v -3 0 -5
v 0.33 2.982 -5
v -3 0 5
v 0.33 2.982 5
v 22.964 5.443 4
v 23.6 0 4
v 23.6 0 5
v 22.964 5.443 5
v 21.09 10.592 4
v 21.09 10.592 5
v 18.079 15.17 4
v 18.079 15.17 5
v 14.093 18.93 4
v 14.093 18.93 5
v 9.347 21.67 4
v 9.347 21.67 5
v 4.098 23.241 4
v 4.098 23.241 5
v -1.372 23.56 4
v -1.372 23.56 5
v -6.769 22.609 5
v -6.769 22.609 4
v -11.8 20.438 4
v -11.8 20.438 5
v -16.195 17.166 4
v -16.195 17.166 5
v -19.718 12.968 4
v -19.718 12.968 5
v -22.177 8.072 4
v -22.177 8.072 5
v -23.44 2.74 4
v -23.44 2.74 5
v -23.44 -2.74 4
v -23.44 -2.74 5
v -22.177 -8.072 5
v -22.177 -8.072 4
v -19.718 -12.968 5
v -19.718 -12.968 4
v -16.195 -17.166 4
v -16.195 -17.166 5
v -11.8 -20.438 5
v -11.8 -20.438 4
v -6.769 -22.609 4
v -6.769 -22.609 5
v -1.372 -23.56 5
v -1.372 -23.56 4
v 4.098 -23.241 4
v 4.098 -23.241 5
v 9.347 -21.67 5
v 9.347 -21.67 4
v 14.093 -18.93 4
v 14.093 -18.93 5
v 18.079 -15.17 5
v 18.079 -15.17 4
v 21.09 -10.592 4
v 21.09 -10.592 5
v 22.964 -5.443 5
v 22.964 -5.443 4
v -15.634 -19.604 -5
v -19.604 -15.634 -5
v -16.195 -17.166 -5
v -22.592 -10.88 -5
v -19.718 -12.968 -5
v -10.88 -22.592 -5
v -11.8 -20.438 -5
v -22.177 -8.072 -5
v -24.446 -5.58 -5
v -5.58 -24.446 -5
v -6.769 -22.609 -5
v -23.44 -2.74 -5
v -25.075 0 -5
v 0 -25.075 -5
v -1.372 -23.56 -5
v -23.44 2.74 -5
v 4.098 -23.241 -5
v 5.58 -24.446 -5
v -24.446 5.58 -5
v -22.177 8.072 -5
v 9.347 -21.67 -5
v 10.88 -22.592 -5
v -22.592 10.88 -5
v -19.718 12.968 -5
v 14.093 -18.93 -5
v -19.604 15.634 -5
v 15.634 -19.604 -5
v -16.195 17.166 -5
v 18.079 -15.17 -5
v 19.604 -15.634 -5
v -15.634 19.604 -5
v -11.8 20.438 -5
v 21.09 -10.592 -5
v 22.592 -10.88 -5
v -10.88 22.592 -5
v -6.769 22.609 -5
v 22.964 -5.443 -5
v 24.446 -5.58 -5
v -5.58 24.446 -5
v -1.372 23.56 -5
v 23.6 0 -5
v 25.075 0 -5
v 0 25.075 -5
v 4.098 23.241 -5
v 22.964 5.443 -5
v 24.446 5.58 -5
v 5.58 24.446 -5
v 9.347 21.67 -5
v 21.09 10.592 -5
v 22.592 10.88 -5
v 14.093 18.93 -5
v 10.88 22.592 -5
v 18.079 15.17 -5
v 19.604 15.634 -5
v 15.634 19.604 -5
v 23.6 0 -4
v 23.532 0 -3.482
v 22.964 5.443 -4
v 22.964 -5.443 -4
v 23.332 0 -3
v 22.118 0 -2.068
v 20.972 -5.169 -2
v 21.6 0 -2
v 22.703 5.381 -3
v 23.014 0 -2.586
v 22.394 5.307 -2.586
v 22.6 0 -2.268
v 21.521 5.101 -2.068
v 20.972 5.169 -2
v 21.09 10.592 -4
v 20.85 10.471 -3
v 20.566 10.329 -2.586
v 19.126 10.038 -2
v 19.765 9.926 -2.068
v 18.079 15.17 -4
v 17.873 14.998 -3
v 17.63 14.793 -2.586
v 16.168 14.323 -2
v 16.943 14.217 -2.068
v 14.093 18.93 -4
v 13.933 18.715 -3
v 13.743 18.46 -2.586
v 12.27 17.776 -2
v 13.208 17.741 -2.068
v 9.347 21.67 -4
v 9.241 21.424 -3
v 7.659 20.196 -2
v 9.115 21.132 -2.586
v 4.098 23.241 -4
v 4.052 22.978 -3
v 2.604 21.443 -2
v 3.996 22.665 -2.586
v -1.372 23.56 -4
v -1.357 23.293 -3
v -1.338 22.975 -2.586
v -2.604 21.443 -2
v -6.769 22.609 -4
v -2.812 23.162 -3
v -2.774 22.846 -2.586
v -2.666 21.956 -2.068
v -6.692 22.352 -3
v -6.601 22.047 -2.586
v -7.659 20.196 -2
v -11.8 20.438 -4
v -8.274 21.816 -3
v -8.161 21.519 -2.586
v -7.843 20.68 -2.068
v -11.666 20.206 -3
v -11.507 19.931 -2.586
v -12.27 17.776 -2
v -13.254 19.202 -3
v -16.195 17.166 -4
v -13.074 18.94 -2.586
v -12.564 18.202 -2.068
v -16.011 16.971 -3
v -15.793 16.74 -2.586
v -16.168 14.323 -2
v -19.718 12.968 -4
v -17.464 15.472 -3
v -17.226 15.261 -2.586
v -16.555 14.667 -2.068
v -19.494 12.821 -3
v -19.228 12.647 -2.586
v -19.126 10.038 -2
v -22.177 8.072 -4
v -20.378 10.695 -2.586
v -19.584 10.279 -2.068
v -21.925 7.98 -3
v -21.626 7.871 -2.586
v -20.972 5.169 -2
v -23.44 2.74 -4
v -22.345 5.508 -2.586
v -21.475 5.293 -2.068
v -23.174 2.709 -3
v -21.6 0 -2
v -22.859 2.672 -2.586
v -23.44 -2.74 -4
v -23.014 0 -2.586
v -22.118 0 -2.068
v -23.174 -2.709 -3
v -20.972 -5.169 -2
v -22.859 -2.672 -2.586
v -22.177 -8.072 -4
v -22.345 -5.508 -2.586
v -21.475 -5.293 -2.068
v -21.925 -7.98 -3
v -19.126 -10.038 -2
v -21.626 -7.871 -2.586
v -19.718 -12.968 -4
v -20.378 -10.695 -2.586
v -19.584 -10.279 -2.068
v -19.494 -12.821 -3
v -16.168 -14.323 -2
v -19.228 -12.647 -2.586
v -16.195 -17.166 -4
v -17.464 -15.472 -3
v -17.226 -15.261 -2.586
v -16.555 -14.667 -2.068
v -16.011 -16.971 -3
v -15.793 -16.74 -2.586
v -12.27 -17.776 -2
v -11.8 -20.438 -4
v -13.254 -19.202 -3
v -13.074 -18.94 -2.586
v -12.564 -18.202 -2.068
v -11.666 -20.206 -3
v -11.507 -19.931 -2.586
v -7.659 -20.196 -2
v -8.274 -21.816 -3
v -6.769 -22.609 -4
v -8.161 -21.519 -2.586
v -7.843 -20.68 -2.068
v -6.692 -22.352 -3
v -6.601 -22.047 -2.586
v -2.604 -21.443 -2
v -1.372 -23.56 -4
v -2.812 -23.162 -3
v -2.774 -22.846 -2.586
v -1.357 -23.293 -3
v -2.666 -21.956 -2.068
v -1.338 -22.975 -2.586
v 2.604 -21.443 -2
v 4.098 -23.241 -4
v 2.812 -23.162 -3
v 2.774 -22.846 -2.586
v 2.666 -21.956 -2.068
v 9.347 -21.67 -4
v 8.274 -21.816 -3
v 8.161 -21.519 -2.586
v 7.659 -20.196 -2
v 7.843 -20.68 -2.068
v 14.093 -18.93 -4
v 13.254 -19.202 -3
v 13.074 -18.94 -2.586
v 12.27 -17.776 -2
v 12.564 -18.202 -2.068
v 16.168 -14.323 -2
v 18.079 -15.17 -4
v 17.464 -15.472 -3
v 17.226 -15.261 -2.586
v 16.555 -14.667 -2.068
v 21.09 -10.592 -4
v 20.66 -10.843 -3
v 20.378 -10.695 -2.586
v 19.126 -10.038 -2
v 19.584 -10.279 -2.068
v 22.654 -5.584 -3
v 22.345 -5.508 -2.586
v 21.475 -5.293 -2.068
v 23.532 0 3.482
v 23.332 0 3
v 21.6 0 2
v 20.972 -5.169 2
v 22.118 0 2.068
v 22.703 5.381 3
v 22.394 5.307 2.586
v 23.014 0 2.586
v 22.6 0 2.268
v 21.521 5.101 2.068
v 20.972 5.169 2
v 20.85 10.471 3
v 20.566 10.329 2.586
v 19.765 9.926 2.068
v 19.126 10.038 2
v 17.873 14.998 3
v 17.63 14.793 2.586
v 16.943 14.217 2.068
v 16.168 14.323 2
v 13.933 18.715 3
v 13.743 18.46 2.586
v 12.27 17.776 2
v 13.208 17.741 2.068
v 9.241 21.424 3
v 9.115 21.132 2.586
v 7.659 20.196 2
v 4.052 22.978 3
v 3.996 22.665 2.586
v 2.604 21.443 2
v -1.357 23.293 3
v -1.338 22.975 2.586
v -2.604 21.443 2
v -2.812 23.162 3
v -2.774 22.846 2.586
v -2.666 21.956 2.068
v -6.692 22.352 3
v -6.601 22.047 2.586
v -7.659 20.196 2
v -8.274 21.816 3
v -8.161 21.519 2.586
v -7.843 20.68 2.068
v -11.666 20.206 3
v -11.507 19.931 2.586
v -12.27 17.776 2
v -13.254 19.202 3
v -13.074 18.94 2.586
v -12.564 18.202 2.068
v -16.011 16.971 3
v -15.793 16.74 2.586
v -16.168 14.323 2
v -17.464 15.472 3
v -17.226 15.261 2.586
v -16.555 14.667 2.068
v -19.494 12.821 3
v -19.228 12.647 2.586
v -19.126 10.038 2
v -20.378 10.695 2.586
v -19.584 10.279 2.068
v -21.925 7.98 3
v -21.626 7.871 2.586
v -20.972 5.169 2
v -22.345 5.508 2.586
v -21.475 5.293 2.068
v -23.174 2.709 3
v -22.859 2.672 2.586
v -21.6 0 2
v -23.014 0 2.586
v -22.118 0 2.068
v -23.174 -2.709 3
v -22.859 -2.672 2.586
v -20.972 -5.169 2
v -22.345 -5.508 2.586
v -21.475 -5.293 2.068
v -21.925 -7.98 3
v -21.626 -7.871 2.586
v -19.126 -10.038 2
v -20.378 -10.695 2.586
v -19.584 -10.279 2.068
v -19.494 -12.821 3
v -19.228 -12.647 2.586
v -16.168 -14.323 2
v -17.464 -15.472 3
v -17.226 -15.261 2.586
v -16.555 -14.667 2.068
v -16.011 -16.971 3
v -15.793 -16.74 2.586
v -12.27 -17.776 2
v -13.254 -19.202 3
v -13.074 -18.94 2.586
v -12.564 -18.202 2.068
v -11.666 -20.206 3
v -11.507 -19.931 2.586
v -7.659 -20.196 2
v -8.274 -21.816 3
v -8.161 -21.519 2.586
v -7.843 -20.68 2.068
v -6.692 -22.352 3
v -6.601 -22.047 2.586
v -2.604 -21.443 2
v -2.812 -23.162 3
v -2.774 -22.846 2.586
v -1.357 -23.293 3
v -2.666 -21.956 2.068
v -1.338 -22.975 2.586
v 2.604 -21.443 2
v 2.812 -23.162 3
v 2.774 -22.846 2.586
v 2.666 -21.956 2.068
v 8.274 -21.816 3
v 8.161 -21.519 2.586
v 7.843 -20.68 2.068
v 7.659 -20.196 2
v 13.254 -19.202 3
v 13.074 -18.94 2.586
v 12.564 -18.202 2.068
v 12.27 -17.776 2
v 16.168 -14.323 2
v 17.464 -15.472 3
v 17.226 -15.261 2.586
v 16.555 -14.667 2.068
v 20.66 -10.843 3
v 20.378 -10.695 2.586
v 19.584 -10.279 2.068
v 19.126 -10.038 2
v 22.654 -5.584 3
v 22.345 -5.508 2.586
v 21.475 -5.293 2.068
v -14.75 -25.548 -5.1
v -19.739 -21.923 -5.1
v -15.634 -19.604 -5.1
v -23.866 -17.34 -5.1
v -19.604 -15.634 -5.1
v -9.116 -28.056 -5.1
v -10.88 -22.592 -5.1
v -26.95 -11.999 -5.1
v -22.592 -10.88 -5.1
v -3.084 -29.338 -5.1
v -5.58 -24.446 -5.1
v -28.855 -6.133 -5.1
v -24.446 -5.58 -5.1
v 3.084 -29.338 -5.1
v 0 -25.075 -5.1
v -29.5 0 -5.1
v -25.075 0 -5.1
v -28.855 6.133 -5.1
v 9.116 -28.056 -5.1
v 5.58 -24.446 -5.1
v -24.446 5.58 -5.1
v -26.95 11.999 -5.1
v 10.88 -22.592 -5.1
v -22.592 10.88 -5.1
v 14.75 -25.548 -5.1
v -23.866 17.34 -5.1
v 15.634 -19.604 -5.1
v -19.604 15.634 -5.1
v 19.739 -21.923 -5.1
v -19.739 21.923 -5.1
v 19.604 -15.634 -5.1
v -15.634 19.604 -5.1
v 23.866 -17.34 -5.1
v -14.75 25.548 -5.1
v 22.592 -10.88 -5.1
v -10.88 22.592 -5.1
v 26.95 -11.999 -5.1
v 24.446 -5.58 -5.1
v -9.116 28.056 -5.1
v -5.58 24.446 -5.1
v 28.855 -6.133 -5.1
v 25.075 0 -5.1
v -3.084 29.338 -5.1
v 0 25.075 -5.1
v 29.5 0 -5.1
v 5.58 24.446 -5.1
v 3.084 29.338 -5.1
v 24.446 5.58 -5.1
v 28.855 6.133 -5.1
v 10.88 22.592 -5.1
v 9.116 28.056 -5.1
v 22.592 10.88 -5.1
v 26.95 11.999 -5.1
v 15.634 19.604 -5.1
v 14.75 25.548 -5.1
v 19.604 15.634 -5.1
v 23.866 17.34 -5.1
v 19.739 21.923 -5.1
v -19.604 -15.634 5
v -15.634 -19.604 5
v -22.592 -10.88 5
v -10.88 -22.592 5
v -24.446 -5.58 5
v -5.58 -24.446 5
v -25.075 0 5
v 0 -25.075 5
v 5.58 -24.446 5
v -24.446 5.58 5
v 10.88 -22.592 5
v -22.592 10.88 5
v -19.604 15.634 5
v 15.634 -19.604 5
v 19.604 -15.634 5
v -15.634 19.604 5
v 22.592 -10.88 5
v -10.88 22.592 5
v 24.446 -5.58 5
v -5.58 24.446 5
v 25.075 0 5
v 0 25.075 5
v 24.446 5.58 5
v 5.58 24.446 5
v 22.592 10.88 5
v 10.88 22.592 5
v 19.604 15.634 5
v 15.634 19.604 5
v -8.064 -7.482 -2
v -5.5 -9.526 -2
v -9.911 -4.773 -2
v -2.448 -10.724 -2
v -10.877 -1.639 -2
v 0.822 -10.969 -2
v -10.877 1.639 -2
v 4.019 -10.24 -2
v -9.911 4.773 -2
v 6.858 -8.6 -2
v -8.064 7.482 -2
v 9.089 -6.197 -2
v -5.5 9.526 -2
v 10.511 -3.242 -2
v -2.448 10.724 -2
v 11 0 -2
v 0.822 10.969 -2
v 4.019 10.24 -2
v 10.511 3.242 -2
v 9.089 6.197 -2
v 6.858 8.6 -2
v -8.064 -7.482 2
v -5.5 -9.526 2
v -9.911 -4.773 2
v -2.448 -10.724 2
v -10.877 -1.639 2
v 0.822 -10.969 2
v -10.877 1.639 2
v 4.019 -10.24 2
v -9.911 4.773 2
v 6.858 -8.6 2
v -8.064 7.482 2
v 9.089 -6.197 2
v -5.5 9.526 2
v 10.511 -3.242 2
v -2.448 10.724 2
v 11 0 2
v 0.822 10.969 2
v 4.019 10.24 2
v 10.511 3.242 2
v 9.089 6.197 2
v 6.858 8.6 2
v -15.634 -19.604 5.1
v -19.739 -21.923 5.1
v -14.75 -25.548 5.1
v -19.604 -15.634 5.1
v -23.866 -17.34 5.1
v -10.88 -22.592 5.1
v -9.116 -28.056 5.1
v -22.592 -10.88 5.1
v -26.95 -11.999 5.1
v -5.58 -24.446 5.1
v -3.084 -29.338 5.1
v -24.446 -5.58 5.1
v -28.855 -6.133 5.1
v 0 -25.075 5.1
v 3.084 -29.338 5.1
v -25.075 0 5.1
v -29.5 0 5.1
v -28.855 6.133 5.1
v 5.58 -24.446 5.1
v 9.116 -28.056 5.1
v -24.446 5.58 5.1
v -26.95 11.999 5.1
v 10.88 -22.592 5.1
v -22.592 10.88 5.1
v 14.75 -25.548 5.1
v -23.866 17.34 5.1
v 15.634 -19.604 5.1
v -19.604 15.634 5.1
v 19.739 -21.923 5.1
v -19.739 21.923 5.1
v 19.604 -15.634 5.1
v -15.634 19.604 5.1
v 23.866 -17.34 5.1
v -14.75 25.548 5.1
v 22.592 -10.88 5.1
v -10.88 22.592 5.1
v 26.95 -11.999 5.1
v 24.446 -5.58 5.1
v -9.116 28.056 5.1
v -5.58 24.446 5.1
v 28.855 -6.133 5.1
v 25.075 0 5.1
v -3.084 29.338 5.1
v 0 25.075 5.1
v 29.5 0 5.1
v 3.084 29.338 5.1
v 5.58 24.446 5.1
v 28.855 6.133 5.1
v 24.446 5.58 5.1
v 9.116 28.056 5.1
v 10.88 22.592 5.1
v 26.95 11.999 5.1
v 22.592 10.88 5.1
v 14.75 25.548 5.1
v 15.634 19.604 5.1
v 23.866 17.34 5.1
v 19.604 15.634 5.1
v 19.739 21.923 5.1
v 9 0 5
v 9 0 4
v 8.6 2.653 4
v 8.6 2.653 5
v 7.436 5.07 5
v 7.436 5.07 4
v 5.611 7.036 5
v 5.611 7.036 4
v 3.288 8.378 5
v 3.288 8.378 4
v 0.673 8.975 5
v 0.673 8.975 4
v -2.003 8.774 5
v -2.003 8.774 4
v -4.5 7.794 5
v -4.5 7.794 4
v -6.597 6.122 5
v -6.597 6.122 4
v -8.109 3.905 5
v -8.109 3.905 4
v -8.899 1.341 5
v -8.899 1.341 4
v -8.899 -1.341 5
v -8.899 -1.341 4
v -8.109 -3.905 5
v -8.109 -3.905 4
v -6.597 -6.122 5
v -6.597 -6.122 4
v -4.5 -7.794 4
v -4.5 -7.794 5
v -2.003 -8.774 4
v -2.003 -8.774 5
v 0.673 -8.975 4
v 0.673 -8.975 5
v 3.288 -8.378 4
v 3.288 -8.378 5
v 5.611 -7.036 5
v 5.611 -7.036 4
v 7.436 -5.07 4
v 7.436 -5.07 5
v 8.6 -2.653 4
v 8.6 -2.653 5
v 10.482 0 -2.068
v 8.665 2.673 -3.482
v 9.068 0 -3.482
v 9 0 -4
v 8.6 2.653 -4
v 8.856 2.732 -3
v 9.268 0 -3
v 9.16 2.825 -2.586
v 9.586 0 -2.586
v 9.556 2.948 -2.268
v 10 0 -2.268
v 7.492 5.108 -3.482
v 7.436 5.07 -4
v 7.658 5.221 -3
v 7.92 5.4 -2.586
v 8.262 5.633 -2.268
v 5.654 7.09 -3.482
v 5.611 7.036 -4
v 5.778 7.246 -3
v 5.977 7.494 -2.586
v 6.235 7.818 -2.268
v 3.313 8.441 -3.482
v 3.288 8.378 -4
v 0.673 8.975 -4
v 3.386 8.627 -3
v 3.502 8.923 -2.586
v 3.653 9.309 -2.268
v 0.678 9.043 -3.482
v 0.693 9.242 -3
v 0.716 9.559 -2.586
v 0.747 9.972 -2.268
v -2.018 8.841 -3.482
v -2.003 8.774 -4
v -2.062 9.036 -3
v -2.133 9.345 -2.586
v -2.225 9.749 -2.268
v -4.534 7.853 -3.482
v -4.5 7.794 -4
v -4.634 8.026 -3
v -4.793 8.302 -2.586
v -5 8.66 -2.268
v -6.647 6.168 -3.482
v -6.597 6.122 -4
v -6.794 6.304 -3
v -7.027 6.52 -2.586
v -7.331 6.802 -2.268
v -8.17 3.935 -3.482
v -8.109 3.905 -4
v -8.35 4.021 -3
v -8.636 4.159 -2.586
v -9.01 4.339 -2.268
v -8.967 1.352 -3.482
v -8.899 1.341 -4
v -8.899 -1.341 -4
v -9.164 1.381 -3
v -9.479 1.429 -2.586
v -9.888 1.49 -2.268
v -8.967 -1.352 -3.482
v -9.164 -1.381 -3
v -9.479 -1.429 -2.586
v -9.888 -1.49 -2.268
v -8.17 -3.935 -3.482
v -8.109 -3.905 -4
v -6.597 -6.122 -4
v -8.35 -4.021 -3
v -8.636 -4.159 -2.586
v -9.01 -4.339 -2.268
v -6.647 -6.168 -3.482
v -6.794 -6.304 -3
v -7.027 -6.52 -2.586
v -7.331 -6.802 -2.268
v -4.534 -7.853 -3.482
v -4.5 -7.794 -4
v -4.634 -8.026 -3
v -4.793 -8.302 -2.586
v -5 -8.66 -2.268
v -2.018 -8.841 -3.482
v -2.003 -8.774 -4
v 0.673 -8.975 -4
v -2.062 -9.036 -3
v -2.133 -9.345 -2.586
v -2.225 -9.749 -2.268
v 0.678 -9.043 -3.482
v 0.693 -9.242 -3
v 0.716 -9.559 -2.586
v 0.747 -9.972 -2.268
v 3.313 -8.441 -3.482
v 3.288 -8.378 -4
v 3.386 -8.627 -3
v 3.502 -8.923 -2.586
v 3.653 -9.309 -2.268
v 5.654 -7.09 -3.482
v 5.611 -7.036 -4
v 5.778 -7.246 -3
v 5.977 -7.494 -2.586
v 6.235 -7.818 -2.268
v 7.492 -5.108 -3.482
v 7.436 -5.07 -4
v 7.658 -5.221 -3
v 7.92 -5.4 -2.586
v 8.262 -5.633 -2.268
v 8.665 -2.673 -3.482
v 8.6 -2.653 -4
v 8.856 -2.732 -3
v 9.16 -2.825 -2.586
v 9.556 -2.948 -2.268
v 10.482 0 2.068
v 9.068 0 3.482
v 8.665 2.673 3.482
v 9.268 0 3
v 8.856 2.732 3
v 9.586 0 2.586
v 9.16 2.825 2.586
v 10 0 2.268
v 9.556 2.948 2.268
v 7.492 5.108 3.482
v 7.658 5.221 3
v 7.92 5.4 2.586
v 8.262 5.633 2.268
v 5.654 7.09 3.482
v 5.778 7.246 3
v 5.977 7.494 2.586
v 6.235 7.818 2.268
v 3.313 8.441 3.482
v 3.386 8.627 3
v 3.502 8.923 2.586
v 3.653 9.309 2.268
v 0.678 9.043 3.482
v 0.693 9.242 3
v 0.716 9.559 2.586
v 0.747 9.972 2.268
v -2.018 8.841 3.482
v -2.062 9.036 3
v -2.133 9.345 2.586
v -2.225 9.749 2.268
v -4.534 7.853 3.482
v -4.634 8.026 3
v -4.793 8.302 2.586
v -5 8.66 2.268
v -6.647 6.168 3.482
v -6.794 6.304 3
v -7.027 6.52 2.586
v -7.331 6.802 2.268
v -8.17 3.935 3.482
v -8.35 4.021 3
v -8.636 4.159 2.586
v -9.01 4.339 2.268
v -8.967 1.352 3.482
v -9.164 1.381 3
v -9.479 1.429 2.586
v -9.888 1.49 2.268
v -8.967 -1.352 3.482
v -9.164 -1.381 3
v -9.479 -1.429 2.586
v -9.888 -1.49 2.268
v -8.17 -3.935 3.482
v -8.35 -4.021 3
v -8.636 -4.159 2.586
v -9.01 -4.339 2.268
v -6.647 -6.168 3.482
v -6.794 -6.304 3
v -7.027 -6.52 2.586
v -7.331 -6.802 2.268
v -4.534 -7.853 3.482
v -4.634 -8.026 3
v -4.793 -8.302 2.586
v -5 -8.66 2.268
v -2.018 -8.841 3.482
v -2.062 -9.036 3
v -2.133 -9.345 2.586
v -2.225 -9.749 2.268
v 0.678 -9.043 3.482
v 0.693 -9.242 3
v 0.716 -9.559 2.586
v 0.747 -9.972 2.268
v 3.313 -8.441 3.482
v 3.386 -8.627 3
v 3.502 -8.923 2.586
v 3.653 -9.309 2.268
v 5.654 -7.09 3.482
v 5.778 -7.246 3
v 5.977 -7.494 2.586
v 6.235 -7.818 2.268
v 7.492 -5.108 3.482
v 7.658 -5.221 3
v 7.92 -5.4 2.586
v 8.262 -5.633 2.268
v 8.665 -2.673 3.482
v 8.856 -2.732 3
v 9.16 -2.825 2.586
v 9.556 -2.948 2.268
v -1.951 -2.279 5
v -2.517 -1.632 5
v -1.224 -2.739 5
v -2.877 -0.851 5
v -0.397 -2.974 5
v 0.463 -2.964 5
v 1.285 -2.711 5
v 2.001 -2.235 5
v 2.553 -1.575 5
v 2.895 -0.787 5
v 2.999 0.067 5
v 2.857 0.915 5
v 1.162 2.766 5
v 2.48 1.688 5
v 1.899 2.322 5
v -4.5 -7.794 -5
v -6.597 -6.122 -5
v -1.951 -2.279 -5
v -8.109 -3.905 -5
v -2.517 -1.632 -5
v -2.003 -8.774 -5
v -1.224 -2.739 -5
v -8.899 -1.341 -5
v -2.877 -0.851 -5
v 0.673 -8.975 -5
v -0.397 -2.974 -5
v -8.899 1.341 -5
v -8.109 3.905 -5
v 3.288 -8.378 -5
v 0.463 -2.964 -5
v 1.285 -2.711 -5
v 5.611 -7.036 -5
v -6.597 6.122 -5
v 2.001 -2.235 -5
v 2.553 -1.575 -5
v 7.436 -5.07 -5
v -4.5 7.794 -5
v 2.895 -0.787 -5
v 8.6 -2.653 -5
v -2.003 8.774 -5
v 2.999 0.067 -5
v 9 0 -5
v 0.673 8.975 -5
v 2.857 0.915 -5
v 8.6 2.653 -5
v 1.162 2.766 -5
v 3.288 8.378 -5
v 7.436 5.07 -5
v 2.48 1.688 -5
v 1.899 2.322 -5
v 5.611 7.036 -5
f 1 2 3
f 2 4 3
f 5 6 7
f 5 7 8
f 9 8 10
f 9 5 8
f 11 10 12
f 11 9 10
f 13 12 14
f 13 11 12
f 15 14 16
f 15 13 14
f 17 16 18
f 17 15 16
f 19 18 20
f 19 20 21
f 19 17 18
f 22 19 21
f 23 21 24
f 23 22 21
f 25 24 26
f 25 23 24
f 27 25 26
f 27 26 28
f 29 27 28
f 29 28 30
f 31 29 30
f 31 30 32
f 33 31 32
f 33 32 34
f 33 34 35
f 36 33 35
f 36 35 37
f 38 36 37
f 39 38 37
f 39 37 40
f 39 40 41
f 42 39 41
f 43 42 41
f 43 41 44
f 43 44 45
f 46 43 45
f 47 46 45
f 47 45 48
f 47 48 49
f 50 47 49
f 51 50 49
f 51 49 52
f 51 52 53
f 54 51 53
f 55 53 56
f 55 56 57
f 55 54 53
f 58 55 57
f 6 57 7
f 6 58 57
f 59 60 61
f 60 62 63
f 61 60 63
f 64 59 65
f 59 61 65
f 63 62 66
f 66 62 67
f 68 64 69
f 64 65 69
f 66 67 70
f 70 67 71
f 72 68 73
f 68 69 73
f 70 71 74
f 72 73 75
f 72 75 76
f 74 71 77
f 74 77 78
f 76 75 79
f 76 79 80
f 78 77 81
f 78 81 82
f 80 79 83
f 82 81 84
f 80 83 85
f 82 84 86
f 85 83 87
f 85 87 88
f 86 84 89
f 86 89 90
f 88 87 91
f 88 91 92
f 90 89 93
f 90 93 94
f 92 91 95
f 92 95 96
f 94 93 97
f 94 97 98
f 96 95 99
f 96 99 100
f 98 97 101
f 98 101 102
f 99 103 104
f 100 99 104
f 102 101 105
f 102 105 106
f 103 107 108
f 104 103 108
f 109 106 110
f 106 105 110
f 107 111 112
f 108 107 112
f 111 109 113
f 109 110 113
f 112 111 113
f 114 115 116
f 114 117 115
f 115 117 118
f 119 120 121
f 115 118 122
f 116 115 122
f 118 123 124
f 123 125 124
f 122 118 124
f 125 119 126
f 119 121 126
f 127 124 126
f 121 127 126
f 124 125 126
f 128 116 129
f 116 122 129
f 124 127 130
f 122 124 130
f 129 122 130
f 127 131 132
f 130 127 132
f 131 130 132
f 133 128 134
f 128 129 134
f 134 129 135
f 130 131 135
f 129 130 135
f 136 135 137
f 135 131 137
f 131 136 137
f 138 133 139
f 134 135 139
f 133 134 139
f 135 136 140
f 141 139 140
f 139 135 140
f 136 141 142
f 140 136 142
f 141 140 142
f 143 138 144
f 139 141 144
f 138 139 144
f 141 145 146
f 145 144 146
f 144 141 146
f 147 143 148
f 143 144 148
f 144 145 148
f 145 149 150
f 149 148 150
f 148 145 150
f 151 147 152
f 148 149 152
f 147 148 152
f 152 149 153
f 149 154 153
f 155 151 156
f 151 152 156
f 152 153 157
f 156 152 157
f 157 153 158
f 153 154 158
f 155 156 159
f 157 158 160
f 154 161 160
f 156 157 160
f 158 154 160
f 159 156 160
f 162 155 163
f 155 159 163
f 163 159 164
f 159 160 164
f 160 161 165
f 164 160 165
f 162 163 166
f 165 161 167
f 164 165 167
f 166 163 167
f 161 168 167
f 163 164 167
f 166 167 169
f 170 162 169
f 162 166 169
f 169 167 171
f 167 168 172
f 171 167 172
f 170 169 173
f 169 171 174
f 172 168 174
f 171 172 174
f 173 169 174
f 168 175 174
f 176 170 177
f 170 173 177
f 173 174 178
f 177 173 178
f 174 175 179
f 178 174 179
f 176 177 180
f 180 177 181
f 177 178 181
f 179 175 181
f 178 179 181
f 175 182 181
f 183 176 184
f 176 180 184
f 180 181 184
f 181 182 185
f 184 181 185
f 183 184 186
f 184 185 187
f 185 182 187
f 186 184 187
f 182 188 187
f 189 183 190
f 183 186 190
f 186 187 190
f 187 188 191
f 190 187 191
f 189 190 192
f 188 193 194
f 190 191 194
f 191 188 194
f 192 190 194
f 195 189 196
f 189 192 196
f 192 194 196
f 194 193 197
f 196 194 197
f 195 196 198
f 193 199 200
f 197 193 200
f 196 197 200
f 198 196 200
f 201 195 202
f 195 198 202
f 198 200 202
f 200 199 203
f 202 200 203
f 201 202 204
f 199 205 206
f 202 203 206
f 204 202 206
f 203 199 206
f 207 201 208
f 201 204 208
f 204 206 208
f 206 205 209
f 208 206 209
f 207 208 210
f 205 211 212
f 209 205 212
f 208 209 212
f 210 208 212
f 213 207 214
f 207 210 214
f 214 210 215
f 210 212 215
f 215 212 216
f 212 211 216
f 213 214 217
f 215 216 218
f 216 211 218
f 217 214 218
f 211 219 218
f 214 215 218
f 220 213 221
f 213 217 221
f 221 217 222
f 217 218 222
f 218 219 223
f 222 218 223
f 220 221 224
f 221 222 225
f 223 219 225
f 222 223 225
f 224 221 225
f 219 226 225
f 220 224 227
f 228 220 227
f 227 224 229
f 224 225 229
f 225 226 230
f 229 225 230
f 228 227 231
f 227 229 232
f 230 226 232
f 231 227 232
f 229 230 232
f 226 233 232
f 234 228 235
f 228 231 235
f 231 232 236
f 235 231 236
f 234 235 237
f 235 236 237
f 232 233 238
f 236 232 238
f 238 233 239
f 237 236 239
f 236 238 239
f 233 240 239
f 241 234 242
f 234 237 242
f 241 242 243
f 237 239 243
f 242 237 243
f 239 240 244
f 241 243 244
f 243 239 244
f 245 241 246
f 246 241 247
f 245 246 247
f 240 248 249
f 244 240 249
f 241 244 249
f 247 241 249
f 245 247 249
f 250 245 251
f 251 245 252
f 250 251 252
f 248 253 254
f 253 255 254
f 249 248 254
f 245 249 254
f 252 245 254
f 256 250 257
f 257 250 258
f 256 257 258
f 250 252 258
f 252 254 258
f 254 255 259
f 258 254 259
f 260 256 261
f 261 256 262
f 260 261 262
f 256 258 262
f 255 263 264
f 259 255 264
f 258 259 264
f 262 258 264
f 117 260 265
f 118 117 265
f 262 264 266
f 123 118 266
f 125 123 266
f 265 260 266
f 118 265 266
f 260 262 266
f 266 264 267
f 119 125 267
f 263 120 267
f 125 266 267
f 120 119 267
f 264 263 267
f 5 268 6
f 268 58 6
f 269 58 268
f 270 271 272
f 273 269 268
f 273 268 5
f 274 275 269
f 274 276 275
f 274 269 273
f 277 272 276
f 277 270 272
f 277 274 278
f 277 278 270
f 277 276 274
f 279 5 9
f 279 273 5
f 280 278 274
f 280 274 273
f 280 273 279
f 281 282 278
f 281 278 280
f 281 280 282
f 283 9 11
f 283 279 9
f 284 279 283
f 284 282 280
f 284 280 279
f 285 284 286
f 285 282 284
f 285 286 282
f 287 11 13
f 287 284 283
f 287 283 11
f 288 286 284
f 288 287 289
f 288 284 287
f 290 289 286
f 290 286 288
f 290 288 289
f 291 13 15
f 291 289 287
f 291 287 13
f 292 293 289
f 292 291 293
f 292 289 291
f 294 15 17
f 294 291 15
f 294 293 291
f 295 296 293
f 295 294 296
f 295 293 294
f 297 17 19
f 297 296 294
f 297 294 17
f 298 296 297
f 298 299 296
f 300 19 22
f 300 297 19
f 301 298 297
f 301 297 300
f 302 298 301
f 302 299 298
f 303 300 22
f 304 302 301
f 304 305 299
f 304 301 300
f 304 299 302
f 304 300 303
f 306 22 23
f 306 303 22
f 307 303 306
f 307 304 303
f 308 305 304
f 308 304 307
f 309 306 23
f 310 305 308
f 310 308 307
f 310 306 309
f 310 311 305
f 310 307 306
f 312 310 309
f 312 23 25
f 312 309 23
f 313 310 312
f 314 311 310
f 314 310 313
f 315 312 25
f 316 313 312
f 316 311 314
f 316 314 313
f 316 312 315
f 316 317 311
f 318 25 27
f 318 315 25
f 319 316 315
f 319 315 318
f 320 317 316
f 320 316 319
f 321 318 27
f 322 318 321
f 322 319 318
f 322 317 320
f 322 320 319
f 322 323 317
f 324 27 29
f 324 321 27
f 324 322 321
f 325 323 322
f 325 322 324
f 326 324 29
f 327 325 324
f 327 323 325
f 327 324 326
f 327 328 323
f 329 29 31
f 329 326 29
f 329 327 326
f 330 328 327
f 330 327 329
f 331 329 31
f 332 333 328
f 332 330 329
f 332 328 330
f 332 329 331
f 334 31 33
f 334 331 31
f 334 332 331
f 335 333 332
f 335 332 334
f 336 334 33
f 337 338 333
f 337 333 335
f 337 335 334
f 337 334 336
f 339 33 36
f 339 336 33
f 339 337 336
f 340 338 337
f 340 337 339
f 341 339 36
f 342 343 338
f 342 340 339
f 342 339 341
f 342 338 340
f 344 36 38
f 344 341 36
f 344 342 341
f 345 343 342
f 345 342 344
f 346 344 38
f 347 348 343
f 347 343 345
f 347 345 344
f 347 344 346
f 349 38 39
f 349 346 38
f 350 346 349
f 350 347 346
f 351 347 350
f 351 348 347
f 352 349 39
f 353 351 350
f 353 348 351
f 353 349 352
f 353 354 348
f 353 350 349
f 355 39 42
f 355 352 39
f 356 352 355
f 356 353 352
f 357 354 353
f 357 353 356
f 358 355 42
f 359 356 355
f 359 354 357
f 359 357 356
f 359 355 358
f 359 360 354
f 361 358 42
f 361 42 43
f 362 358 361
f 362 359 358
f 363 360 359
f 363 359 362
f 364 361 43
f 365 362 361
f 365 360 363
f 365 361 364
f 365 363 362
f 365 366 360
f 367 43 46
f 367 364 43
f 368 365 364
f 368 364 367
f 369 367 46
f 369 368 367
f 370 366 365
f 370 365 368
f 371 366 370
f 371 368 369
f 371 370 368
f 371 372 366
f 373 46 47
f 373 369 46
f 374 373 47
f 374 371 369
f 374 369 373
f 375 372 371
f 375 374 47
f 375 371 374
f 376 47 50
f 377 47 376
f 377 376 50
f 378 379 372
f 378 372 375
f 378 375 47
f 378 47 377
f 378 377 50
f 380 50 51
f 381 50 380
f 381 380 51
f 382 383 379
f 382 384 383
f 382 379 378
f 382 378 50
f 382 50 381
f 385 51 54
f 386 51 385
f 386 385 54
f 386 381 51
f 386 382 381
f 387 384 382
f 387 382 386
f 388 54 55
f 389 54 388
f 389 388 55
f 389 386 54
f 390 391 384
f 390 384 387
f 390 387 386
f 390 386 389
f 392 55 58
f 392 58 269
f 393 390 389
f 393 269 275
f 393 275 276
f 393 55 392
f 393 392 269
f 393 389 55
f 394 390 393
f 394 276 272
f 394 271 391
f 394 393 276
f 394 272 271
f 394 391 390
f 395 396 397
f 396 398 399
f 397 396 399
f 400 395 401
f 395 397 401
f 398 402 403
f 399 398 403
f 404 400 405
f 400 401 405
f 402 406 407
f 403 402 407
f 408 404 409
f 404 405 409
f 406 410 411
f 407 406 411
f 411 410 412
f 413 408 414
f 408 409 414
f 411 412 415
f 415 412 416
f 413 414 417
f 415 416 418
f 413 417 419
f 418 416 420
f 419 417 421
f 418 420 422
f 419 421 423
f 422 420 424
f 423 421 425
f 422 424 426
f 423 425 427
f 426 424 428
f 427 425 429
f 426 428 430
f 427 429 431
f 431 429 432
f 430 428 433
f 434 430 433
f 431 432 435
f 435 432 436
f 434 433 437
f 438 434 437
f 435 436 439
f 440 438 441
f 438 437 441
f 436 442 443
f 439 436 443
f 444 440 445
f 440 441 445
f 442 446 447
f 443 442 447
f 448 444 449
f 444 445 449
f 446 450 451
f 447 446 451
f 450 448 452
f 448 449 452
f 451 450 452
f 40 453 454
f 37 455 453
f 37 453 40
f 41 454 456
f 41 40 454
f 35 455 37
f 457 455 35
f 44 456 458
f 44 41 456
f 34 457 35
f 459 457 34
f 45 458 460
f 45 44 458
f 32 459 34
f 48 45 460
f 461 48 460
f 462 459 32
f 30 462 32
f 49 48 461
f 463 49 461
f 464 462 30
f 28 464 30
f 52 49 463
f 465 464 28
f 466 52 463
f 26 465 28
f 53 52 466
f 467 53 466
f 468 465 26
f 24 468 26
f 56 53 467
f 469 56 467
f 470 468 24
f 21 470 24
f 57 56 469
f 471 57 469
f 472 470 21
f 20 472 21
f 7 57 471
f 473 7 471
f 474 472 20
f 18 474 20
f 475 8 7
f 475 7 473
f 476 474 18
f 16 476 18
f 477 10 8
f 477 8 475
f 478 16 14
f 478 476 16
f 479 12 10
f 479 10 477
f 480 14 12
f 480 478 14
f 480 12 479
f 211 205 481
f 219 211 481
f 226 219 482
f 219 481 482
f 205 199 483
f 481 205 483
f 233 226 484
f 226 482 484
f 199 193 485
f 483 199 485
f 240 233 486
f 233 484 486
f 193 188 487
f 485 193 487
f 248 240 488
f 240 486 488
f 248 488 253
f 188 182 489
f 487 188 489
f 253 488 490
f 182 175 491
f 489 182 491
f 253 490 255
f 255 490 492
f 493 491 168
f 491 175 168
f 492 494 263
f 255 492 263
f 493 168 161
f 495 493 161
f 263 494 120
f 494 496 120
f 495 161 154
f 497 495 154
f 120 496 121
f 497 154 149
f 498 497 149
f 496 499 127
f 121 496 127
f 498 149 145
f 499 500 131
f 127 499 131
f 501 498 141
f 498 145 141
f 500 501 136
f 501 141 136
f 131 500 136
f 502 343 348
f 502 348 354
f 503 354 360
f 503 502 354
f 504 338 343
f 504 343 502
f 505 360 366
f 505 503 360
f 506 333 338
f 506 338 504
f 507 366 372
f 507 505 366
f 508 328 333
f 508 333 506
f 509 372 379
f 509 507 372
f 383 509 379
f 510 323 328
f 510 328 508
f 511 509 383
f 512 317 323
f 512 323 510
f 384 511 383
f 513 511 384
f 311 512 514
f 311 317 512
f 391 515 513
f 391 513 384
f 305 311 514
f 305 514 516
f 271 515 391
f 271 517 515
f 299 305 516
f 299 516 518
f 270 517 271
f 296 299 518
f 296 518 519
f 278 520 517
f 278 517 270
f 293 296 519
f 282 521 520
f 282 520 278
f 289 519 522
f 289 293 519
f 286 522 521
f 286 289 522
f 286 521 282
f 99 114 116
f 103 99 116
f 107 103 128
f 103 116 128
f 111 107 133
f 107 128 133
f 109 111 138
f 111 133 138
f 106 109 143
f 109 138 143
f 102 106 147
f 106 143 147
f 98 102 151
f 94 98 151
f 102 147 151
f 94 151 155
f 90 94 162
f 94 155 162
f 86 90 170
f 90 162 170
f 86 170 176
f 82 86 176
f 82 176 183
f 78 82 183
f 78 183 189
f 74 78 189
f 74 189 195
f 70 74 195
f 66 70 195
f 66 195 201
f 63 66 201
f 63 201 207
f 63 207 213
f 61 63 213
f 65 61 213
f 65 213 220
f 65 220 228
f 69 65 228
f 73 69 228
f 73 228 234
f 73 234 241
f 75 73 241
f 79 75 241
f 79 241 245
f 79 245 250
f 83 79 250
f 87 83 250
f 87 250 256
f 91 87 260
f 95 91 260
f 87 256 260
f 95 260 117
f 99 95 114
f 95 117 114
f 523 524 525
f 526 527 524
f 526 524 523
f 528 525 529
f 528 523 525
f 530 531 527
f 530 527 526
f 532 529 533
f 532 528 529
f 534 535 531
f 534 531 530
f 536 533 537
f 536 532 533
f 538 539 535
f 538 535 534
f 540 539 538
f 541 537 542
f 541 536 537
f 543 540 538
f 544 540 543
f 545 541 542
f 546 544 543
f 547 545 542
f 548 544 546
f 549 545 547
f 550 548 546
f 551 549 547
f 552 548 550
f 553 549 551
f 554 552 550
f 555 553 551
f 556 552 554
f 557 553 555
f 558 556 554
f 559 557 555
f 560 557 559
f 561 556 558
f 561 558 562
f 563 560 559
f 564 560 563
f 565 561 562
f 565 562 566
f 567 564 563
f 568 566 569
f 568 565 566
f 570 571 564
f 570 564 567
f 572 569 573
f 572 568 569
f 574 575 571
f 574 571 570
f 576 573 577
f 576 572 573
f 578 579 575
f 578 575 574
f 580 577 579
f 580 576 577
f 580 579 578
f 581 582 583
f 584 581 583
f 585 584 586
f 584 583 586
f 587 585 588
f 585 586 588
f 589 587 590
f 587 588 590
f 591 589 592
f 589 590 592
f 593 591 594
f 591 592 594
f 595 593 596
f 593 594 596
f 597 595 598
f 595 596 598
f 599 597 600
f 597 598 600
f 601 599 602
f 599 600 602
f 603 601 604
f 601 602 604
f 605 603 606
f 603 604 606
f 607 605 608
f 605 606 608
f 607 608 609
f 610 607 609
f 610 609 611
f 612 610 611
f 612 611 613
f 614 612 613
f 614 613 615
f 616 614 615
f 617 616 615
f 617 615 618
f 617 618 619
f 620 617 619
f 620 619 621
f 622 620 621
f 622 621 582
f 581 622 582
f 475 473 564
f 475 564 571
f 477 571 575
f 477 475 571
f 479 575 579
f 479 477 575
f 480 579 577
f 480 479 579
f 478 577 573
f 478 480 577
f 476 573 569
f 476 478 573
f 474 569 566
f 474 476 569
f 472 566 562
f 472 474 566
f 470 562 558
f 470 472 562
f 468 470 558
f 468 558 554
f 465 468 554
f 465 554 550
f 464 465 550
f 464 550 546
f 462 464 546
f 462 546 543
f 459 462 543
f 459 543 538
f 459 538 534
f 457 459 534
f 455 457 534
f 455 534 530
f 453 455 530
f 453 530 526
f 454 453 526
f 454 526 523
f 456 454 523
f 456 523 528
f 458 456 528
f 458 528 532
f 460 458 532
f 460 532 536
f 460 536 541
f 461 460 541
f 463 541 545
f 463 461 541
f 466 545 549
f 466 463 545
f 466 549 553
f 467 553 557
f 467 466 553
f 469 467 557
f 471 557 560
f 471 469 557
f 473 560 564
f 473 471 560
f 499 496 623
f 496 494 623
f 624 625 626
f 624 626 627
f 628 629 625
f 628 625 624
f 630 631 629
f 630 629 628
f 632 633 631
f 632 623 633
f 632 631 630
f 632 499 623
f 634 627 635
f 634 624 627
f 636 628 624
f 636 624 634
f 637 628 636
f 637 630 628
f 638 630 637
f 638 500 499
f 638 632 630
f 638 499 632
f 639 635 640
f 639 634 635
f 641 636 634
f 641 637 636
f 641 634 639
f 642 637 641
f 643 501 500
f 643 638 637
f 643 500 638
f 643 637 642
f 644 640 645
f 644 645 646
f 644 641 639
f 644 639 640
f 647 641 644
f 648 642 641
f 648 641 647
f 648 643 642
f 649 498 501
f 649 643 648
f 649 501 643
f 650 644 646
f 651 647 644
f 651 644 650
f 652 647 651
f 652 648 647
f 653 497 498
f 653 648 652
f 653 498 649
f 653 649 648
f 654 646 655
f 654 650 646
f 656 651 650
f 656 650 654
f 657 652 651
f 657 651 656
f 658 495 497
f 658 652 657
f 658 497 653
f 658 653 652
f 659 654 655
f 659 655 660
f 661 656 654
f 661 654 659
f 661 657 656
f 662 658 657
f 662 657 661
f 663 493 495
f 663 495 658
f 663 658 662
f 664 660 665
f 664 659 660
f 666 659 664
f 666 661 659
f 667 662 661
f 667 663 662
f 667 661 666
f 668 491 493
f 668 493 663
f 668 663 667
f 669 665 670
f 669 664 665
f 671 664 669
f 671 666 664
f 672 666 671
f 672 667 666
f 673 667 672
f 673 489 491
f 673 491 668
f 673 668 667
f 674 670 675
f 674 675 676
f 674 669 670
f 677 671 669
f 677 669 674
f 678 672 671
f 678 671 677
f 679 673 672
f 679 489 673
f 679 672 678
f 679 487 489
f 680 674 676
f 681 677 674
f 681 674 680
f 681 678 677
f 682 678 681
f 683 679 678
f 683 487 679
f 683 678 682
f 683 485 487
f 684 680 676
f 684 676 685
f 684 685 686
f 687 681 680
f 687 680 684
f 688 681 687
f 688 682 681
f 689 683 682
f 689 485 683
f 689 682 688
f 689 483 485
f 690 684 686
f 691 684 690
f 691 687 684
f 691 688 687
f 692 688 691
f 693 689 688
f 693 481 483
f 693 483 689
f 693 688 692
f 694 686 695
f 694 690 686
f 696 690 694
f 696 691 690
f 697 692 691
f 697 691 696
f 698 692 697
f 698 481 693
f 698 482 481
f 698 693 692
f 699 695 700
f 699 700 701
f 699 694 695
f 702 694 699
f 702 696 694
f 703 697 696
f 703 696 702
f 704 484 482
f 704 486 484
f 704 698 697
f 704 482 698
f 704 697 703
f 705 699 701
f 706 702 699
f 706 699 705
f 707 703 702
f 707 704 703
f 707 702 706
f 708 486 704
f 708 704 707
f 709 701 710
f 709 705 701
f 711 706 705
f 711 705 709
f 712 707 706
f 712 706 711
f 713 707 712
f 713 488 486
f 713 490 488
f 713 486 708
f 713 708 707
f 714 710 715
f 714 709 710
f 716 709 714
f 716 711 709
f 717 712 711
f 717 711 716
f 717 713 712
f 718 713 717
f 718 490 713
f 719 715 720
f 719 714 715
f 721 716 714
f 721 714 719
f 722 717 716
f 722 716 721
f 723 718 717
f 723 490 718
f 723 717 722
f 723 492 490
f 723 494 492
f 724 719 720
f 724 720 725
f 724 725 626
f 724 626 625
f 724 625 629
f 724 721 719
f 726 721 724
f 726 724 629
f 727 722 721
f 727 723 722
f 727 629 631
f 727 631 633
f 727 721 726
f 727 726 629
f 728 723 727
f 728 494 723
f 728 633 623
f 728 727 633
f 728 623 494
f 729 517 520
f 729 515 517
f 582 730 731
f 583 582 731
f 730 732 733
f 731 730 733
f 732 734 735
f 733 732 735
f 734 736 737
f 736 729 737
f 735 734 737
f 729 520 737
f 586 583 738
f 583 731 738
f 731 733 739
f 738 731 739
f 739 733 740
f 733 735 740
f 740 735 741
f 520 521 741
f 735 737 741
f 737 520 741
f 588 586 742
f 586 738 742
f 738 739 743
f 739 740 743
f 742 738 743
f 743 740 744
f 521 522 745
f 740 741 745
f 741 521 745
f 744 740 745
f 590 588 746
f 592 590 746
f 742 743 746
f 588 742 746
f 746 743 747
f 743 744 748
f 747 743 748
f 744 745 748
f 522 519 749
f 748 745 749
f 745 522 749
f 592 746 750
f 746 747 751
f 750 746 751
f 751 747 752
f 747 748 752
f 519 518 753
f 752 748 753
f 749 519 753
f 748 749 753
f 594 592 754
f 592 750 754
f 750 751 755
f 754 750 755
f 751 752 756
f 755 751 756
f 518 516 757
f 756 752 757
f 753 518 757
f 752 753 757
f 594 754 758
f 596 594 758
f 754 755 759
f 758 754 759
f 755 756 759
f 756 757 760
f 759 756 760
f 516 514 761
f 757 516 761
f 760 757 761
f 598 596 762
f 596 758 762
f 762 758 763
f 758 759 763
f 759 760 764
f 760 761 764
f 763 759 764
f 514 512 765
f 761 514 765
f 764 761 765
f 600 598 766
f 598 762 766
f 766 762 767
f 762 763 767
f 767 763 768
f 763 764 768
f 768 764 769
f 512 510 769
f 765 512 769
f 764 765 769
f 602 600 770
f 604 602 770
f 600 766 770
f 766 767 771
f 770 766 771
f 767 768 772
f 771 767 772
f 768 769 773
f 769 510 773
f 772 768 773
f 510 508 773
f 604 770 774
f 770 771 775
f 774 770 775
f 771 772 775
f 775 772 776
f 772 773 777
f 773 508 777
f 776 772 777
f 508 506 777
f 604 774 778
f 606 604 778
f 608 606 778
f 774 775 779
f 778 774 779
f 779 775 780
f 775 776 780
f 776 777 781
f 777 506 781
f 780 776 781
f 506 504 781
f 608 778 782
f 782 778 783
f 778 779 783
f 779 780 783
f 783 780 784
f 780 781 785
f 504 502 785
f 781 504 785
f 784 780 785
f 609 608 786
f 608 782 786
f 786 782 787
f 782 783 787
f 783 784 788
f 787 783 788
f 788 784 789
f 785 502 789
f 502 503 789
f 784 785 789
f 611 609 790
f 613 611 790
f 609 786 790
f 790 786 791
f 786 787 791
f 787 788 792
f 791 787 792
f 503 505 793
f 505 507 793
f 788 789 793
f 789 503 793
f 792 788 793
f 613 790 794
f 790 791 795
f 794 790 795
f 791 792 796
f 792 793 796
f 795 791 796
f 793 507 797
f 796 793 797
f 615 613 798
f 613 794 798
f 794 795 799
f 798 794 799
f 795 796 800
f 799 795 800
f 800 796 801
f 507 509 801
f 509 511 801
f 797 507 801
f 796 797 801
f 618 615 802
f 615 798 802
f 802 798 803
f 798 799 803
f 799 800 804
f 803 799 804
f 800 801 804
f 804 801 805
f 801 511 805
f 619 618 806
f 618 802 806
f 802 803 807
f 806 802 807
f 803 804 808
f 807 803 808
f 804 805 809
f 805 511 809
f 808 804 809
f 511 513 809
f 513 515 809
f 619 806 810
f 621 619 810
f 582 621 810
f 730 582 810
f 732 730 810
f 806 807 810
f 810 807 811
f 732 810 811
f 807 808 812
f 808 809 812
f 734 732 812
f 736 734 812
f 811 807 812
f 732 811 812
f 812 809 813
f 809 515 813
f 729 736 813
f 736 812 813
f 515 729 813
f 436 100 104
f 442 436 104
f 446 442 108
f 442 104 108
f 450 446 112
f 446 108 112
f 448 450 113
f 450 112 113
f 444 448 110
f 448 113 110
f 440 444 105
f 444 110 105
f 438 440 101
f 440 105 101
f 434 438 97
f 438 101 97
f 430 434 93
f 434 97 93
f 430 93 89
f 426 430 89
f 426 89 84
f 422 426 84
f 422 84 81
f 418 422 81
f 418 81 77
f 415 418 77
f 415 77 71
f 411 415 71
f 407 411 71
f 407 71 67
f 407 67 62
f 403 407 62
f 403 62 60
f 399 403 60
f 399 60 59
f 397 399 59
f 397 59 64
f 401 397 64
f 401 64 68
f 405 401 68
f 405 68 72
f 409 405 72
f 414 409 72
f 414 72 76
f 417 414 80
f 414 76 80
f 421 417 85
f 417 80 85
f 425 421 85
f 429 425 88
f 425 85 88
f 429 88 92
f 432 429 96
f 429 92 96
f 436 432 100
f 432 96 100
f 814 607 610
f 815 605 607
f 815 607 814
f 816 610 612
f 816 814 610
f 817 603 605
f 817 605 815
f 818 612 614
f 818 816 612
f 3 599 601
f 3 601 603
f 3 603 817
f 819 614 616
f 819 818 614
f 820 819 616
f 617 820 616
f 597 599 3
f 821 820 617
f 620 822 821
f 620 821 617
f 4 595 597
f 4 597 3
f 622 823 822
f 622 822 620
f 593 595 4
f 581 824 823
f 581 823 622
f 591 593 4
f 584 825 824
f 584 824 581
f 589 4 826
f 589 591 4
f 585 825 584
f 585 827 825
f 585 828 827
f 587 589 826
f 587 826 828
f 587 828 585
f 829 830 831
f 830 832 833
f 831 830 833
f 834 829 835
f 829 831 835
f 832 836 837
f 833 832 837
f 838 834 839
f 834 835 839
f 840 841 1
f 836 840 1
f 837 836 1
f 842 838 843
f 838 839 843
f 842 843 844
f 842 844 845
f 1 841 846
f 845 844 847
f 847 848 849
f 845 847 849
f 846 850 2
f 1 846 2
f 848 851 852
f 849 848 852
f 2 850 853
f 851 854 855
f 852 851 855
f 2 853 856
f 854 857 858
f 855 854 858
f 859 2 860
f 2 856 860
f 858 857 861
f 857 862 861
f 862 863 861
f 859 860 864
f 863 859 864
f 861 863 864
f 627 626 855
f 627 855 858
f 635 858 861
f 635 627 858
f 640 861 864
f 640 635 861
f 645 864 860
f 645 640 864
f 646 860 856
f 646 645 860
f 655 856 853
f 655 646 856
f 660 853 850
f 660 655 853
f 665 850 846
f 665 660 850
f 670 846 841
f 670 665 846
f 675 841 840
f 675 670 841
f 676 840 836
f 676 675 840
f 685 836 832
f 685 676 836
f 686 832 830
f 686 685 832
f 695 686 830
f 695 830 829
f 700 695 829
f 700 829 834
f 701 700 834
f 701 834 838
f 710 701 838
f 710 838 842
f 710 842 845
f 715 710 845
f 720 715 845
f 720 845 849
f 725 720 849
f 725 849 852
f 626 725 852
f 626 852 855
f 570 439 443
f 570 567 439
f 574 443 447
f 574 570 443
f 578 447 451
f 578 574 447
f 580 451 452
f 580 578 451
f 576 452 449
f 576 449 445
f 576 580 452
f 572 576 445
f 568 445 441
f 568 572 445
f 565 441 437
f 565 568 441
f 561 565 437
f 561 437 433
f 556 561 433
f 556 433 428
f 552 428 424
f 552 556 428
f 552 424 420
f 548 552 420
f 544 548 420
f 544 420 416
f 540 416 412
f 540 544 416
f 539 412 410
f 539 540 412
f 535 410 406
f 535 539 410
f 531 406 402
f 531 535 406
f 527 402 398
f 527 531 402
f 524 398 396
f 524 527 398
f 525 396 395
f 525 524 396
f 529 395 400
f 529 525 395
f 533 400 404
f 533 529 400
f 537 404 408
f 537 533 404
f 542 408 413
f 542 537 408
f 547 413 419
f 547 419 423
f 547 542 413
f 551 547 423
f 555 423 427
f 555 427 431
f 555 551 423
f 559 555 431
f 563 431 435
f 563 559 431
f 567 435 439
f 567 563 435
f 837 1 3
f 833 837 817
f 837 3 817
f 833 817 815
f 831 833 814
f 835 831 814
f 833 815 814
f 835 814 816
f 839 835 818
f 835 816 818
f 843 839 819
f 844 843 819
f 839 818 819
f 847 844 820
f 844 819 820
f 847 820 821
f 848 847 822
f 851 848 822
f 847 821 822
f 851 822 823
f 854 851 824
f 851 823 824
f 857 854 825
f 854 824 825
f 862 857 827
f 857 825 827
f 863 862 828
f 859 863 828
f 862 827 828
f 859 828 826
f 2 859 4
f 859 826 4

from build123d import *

# Parameters (mm, degrees)
ESQUISSE1_R           = 9
BOSS_EXTRU_1_DEPTH    = 5
ESQUISSE1_R_2         = 25.075
ESQUISSE1_R_3         = 23.6
BOSS_EXTRU_1_2_DEPTH  = 5
ESQUISSE1_3_R         = 23.6
ESQUISSE1_3_R_2       = 9
BOSS_EXTRU_2_DEPTH    = 2
ESQUISSE1_4_R         = 29.5
ESQUISSE1_4_R_2       = 25.075
BOSS_EXTRU_3_DEPTH    = 5.1
CONG_1_R              = 2
CONG_1_OF_SYM_TRIE1_R = 2


with BuildPart() as part:
    # Esquisse1 → Boss.-Extru.1 (new body)
    with BuildSketch(Plane.XY):
        Circle(ESQUISSE1_R)
        with BuildLine():
            ThreePointArc((-3, 0), (2.001193394, -2.235), (0.33015, 2.981778157))
            Line((0.33015, 2.981778157), (-3, 0))
        make_face(mode=Mode.SUBTRACT)
    boss_extru_1 = extrude(amount=BOSS_EXTRU_1_DEPTH)



with BuildPart() as body_2:
    # Esquisse1 → Boss.-Extru.1 2 (new body)
    with BuildSketch(Plane.XY):
        Circle(ESQUISSE1_R_2)
        Circle(ESQUISSE1_R_3, mode=Mode.SUBTRACT)
    boss_extru_1_2 = extrude(amount=BOSS_EXTRU_1_2_DEPTH)


with BuildPart() as part_1:
    add(part.part)

    add(body_2.part)  # Boss.-Extru.2 merges body 2
    # Esquisse1<3> → Boss.-Extru.2 (add)
    with BuildSketch(Plane.XY):
        Circle(ESQUISSE1_3_R)
        Circle(ESQUISSE1_3_R_2, mode=Mode.SUBTRACT)
    boss_extru_2 = extrude(amount=BOSS_EXTRU_2_DEPTH)

    # Esquisse1<4> → Boss.-Extru.3 (add)
    with BuildSketch(Plane.XY):
        Circle(ESQUISSE1_4_R)
        Circle(ESQUISSE1_4_R_2, mode=Mode.SUBTRACT)
    boss_extru_3 = extrude(amount=BOSS_EXTRU_3_DEPTH)

    # Congé1
    cong_1_edges = [part_1.edges().sort_by_distance(p)[0] for p in [
        (-9, 0, 2),
        (-23.6, 0, 2),
    ]]
    fillet(cong_1_edges, radius=CONG_1_R)


with BuildPart() as sym_trie1_1:
    # Symétrie1: Boss.-Extru.1, Boss.-Extru.1 2, Boss.-Extru.2, Boss.-Extru.3 across Front Plane
    add(boss_extru_1.mirror(Plane.XY))
    add(boss_extru_1_2.mirror(Plane.XY))
    add(boss_extru_2.mirror(Plane.XY))
    add(boss_extru_3.mirror(Plane.XY))

    # Congé1 of Symétrie1
    cong_1_of_sym_trie1_edges = [sym_trie1_1.edges().sort_by_distance(p)[0] for p in [
        (-9, 0, -2),
        (-23.6, 0, -2),
    ]]
    fillet(cong_1_of_sym_trie1_edges, radius=CONG_1_OF_SYM_TRIE1_R)


with BuildPart() as part_2:
    add(part_1.part)

    # Symétrie1 united with what the copies to: union Symétrie1_1
    add(sym_trie1_1.part)


solid = part_2.part
